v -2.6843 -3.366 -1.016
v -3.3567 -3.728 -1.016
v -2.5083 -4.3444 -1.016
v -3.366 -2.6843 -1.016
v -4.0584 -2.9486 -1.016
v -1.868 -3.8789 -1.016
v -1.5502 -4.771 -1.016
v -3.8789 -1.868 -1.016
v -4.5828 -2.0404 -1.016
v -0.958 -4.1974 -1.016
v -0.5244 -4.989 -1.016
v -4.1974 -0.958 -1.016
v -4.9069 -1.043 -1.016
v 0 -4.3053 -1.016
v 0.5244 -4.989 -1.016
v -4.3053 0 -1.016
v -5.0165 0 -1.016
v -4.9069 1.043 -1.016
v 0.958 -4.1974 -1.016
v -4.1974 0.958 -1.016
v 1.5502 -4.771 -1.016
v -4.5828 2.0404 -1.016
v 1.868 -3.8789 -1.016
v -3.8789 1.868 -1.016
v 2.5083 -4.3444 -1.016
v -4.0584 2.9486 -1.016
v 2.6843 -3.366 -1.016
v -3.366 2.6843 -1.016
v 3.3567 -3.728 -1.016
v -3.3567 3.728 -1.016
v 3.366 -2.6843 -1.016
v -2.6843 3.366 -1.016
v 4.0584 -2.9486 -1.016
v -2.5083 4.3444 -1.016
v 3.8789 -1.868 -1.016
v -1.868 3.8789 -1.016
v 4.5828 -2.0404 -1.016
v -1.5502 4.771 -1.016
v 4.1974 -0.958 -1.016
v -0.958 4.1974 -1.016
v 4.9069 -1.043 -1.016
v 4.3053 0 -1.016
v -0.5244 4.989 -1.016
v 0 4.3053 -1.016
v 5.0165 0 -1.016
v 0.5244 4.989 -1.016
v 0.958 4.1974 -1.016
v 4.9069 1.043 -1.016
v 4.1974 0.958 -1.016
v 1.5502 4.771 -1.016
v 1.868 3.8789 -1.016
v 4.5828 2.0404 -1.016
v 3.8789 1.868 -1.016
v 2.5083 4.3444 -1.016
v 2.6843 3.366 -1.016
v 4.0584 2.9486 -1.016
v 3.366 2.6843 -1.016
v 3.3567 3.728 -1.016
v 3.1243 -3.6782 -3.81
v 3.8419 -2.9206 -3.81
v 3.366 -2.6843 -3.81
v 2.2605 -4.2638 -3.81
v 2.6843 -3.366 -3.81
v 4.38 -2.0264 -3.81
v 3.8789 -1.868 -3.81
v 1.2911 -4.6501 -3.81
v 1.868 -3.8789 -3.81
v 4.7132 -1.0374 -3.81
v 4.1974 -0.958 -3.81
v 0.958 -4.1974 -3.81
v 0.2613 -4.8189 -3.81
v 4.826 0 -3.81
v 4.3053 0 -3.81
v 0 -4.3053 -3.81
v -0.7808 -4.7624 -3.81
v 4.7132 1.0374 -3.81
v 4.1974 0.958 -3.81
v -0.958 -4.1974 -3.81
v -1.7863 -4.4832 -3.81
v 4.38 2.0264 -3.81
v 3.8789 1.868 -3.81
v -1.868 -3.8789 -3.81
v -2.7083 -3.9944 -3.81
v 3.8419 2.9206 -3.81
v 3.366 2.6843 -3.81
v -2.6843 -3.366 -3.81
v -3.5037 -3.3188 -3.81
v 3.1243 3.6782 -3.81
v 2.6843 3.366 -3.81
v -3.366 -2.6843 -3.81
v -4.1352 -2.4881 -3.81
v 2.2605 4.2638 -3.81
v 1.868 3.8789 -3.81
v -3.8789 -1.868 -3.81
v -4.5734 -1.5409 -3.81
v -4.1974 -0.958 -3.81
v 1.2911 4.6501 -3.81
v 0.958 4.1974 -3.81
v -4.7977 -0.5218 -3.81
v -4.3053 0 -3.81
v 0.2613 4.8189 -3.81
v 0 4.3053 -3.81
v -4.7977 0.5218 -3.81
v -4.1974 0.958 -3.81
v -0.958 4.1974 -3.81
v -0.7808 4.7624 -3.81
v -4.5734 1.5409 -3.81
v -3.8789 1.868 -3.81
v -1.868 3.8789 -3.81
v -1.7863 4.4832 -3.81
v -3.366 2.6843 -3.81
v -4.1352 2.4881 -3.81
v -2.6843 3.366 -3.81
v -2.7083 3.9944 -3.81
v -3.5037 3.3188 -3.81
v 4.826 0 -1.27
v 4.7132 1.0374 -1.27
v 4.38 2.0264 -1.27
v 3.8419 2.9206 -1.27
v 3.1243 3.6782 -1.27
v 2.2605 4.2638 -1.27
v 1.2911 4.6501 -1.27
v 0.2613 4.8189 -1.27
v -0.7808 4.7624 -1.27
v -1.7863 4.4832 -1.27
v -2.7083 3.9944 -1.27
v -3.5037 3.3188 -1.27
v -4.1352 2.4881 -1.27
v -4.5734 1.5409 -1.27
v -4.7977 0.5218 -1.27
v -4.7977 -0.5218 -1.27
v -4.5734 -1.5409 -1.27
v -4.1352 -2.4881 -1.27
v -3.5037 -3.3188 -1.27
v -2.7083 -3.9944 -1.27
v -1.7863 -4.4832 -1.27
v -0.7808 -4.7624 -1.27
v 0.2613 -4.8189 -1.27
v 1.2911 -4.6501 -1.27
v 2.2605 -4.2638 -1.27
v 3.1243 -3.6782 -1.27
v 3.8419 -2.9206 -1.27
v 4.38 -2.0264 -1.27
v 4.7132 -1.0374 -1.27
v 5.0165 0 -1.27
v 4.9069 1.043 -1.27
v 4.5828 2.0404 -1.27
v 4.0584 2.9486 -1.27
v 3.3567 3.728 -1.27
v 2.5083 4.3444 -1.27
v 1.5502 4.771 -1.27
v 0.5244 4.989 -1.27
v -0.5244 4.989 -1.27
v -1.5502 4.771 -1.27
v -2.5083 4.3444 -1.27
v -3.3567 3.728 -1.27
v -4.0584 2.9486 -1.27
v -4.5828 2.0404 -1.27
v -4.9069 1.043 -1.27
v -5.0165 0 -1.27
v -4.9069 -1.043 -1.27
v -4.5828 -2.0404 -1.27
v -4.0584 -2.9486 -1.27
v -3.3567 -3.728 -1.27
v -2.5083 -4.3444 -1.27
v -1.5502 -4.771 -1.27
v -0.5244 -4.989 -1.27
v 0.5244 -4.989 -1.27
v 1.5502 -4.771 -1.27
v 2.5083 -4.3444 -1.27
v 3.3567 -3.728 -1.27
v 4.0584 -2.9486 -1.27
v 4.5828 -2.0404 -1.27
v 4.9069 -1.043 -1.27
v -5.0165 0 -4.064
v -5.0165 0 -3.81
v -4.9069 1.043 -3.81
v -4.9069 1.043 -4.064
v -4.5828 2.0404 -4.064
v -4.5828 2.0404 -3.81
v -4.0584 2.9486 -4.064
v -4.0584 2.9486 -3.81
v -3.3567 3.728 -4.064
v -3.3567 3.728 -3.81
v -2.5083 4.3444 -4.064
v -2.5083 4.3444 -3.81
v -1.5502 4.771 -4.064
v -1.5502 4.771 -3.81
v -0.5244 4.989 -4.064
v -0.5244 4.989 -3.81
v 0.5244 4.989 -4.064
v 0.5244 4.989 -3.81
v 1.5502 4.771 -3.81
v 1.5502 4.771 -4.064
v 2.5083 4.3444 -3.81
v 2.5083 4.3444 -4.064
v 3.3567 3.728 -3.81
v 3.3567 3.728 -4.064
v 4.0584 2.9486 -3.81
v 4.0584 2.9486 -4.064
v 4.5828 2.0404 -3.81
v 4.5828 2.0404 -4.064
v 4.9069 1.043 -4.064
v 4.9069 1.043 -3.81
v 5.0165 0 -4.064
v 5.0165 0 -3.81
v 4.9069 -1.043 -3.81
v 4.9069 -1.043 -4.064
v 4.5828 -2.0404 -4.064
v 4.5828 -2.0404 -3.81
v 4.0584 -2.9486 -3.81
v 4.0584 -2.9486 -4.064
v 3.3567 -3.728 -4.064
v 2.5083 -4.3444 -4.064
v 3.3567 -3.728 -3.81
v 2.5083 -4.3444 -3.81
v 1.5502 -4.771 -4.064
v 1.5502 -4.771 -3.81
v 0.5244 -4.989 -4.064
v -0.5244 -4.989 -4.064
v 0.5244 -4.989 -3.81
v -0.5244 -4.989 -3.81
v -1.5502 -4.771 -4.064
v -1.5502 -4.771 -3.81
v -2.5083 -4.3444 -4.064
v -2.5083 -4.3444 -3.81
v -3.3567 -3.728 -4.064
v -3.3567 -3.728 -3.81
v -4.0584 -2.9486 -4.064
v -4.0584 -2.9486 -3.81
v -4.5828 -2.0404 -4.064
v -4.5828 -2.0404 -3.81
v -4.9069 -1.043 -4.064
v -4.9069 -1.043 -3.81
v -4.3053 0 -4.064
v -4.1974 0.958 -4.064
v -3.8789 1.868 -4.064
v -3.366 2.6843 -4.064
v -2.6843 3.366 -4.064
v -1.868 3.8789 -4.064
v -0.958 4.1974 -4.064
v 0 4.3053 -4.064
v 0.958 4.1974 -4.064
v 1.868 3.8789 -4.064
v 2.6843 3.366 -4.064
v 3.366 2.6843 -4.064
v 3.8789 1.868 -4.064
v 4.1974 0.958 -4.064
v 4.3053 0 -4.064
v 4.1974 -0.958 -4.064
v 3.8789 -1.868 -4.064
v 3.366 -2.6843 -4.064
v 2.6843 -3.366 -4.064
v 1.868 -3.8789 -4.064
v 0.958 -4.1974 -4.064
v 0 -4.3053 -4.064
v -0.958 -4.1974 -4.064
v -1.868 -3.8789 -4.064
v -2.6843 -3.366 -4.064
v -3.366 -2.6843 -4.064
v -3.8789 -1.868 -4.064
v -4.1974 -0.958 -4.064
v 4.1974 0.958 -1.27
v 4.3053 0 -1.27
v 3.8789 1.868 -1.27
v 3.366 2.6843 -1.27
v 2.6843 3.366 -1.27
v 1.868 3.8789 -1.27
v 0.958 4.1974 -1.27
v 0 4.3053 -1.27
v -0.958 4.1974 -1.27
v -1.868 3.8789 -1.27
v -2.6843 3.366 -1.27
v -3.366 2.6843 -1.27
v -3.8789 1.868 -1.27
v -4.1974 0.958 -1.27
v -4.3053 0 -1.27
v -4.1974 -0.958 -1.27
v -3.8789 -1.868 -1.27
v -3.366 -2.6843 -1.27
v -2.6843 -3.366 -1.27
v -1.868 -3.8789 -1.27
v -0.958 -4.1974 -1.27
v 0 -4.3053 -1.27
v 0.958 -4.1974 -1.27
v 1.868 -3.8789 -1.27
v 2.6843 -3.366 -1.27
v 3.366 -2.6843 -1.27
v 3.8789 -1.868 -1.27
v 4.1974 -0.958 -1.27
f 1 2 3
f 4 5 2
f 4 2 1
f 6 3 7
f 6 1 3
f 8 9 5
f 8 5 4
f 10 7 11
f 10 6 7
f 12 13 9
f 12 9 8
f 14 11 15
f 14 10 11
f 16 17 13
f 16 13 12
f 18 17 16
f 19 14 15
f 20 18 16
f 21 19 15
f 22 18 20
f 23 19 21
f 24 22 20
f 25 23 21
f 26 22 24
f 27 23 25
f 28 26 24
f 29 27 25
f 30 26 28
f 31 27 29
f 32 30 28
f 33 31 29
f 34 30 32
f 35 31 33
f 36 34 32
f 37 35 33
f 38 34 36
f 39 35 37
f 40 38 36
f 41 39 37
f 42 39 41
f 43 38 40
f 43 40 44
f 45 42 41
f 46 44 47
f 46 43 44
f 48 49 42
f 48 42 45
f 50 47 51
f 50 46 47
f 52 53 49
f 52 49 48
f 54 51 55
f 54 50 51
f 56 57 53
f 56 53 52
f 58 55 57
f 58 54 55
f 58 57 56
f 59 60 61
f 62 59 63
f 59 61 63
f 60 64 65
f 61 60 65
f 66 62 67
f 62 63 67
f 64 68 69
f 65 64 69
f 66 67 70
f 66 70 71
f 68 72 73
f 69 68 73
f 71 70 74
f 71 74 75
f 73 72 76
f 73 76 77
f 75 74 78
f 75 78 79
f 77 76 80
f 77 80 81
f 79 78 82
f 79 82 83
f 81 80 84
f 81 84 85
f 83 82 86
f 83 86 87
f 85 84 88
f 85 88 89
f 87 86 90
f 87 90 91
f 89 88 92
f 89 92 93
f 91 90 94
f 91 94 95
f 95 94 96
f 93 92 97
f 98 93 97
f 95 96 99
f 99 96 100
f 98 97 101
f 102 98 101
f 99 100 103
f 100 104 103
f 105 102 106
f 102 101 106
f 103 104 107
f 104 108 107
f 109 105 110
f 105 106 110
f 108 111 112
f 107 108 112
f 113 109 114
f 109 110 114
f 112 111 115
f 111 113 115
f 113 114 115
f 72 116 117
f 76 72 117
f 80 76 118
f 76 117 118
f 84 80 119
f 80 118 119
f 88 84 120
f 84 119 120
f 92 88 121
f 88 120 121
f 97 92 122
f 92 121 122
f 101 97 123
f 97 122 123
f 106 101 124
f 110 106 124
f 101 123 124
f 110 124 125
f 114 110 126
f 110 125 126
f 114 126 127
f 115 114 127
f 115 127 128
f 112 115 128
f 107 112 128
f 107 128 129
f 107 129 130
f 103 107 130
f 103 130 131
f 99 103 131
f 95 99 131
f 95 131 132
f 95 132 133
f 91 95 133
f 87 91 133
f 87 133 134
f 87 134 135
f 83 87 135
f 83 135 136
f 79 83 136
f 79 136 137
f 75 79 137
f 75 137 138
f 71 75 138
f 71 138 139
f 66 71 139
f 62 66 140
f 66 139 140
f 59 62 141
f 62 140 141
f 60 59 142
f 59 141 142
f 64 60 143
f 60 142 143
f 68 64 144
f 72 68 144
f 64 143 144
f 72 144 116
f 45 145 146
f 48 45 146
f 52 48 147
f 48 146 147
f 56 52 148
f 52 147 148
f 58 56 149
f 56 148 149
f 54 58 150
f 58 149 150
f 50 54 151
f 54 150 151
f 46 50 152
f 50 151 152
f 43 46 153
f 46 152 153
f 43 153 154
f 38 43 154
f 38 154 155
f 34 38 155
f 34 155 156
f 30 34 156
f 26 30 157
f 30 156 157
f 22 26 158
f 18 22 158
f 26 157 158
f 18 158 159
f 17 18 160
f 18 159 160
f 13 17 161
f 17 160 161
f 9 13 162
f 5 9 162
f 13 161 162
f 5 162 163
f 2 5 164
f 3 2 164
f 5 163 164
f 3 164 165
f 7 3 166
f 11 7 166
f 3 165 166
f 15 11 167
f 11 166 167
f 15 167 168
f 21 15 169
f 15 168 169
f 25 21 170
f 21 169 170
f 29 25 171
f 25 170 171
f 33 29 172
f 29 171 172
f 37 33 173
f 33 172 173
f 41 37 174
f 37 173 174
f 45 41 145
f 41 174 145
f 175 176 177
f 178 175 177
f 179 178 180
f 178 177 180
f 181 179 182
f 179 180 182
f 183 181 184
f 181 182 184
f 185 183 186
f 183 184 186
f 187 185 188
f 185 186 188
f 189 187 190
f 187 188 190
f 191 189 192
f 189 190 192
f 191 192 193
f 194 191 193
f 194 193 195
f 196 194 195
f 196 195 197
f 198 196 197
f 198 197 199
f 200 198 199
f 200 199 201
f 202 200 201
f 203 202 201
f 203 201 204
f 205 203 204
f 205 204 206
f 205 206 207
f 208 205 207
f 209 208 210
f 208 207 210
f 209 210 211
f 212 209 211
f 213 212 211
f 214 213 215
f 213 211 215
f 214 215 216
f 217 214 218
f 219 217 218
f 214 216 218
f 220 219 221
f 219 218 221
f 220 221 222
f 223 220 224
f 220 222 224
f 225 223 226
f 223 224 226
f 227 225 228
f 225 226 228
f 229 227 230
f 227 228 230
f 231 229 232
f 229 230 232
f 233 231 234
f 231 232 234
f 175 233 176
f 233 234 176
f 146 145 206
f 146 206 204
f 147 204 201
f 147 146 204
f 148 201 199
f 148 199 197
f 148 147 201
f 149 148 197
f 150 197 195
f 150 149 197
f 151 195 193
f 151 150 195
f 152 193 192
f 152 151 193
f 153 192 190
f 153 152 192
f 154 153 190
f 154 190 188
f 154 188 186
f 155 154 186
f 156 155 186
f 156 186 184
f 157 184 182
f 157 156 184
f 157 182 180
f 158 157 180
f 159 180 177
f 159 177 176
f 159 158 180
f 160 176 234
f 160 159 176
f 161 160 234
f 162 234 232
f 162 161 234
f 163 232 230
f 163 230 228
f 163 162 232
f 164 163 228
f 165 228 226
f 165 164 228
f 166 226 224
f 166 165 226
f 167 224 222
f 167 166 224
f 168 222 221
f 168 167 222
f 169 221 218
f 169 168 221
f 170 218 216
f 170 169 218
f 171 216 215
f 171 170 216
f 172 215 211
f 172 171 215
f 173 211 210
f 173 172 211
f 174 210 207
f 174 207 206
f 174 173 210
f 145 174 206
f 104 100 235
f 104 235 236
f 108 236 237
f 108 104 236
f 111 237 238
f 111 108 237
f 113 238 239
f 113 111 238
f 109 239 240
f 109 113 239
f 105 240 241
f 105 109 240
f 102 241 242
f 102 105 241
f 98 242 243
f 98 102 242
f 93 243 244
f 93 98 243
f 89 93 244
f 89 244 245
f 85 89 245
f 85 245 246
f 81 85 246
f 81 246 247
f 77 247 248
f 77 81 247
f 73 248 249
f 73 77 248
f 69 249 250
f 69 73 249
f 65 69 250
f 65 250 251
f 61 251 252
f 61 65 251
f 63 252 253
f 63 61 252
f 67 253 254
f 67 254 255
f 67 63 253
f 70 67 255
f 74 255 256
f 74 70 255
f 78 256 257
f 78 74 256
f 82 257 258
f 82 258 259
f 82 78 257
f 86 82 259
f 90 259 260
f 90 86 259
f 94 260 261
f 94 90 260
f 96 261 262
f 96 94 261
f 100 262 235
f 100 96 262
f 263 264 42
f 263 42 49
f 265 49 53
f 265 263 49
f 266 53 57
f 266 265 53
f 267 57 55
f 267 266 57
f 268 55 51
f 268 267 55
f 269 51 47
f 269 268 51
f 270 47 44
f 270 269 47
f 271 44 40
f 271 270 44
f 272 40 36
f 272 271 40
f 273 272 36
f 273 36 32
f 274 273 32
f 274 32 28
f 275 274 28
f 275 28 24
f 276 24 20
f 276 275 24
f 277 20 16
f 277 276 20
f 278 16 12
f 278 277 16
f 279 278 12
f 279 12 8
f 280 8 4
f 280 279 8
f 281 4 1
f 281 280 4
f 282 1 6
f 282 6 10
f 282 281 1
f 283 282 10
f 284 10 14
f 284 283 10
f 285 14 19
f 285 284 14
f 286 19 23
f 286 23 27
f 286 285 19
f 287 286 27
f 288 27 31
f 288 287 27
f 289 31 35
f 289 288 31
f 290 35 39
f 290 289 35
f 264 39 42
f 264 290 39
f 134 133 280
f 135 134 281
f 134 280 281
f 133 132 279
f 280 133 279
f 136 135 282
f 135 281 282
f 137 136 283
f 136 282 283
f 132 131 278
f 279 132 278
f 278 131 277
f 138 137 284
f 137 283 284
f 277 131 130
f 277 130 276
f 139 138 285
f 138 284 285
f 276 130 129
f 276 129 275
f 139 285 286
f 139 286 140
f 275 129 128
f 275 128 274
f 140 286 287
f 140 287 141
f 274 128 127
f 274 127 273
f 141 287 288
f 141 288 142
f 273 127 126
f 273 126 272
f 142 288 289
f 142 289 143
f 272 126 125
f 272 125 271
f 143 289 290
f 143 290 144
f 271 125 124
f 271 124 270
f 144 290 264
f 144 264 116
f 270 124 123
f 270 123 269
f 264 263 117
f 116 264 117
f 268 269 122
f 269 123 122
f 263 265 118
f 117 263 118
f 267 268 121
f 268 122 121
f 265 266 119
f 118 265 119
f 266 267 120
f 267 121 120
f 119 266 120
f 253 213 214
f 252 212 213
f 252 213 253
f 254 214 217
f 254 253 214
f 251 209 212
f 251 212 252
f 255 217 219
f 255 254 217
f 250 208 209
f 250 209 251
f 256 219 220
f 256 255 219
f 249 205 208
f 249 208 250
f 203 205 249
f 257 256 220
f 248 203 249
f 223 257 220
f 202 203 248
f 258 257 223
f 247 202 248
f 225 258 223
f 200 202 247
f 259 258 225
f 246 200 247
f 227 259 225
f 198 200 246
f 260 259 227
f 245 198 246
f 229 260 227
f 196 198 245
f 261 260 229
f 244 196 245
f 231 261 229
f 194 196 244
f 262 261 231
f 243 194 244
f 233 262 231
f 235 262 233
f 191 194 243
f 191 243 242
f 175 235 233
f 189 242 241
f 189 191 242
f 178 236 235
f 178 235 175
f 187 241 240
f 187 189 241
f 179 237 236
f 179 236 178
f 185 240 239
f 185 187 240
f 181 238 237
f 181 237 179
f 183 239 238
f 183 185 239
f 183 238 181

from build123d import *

# Parameters (mm, degrees)
SKETCH2_R           = 8.6106
BOSS_EXTRUDE1_DEPTH = 4.064
SKETCH3_R           = 10.033
BOSS_EXTRUDE2_DEPTH = 5.08
SKETCH4_R           = 8.6106
CUT_EXTRUDE1_DEPTH  = 6.08
SKETCH9_R           = 10.033
SKETCH9_R_2         = 8.128
BOSS_EXTRUDE3_DEPTH = 0.508
SKETCH10_R          = 10.033
SKETCH10_R_2        = 8.128
BOSS_EXTRUDE4_DEPTH = 0.508
SKETCH12_R          = 9.271
CUT_EXTRUDE2_DEPTH  = 7.096
SKETCH13_R          = 10.033
CUT_EXTRUDE3_DEPTH  = 0.508
SKETCH15_R          = 10.033
SKETCH15_R_2        = 9.271
CUT_EXTRUDE4_DEPTH  = 0.508
SKETCH16_R          = 9.652
SKETCH16_R_2        = 9.271
CUT_EXTRUDE5_DEPTH  = 6.08
SKETCH17_R          = 10.033
SKETCH17_R_2        = 8.6106
BOSS_EXTRUDE5_DEPTH = 0.508
SKETCH18_R          = 10.033
SKETCH18_R_2        = 8.6106
BOSS_EXTRUDE6_DEPTH = 0.508
SCALE1_SCALE        = 0.5


with BuildPart() as part:
    # Sketch2 → Boss-Extrude1 (new body)
    with BuildSketch(Plane.XY):
        Circle(SKETCH2_R)
    extrude(amount=-BOSS_EXTRUDE1_DEPTH)

    # Sketch3 → Boss-Extrude2 (add)
    with BuildSketch(Plane.XY):
        Circle(SKETCH3_R)
    extrude(amount=-BOSS_EXTRUDE2_DEPTH)

    # Sketch4 → Cut-Extrude1 (cut, through all)
    with BuildSketch(Plane.XY):
        Circle(SKETCH4_R)
    extrude(amount=-CUT_EXTRUDE1_DEPTH, mode=Mode.SUBTRACT)

    # Sketch9 → Boss-Extrude3 (add)
    with BuildSketch(Plane.XY):
        Circle(SKETCH9_R)
        Circle(SKETCH9_R_2, mode=Mode.SUBTRACT)
    extrude(amount=BOSS_EXTRUDE3_DEPTH)

    # Sketch10 → Boss-Extrude4 (add)
    with BuildSketch(Plane(origin=(0, 0, -5.08), x_dir=(-1, 0, 0), z_dir=(0, 0, -1))):
        Circle(SKETCH10_R)
        Circle(SKETCH10_R_2, mode=Mode.SUBTRACT)
    extrude(amount=BOSS_EXTRUDE4_DEPTH)

    # Sketch12 → Cut-Extrude2 (cut, through all)
    with BuildSketch(Plane(origin=(0, 0, -5.588), x_dir=(-1, 0, 0), z_dir=(0, 0, -1))):
        Circle(SKETCH12_R)
    extrude(amount=-CUT_EXTRUDE2_DEPTH, mode=Mode.SUBTRACT)

    # Sketch13 → Cut-Extrude3 (cut)
    with BuildSketch(Plane(origin=(0, 0, -5.588), x_dir=(-1, 0, 0), z_dir=(0, 0, -1))):
        Circle(SKETCH13_R)
    extrude(amount=-CUT_EXTRUDE3_DEPTH, mode=Mode.SUBTRACT)

    # Sketch15 → Cut-Extrude4 (cut)
    with BuildSketch(Plane.XY.offset(0.508)):
        Circle(SKETCH15_R)
        Circle(SKETCH15_R_2, mode=Mode.SUBTRACT)
    extrude(amount=-CUT_EXTRUDE4_DEPTH, mode=Mode.SUBTRACT)

    # Sketch16 → Cut-Extrude5 (cut, through all)
    with BuildSketch(Plane.XY):
        Circle(SKETCH16_R)
        Circle(SKETCH16_R_2, mode=Mode.SUBTRACT)
    extrude(amount=-CUT_EXTRUDE5_DEPTH, mode=Mode.SUBTRACT)

    # Sketch17 → Boss-Extrude5 (add)
    with BuildSketch(Plane.XY):
        Circle(SKETCH17_R)
        Circle(SKETCH17_R_2, mode=Mode.SUBTRACT)
    extrude(amount=BOSS_EXTRUDE5_DEPTH)

    # Sketch18 → Boss-Extrude6 (add)
    with BuildSketch(Plane(origin=(0, 0, -5.08), x_dir=(-1, 0, 0), z_dir=(0, 0, -1))):
        Circle(SKETCH18_R)
        Circle(SKETCH18_R_2, mode=Mode.SUBTRACT)
    extrude(amount=BOSS_EXTRUDE6_DEPTH)


with BuildPart() as part_1:
    # Scale1: scaled about (0, 0, -2.54)
    add(part.part.scale(SCALE1_SCALE).moved(Location((0, 0, -1.27))))


solid = part_1.part
